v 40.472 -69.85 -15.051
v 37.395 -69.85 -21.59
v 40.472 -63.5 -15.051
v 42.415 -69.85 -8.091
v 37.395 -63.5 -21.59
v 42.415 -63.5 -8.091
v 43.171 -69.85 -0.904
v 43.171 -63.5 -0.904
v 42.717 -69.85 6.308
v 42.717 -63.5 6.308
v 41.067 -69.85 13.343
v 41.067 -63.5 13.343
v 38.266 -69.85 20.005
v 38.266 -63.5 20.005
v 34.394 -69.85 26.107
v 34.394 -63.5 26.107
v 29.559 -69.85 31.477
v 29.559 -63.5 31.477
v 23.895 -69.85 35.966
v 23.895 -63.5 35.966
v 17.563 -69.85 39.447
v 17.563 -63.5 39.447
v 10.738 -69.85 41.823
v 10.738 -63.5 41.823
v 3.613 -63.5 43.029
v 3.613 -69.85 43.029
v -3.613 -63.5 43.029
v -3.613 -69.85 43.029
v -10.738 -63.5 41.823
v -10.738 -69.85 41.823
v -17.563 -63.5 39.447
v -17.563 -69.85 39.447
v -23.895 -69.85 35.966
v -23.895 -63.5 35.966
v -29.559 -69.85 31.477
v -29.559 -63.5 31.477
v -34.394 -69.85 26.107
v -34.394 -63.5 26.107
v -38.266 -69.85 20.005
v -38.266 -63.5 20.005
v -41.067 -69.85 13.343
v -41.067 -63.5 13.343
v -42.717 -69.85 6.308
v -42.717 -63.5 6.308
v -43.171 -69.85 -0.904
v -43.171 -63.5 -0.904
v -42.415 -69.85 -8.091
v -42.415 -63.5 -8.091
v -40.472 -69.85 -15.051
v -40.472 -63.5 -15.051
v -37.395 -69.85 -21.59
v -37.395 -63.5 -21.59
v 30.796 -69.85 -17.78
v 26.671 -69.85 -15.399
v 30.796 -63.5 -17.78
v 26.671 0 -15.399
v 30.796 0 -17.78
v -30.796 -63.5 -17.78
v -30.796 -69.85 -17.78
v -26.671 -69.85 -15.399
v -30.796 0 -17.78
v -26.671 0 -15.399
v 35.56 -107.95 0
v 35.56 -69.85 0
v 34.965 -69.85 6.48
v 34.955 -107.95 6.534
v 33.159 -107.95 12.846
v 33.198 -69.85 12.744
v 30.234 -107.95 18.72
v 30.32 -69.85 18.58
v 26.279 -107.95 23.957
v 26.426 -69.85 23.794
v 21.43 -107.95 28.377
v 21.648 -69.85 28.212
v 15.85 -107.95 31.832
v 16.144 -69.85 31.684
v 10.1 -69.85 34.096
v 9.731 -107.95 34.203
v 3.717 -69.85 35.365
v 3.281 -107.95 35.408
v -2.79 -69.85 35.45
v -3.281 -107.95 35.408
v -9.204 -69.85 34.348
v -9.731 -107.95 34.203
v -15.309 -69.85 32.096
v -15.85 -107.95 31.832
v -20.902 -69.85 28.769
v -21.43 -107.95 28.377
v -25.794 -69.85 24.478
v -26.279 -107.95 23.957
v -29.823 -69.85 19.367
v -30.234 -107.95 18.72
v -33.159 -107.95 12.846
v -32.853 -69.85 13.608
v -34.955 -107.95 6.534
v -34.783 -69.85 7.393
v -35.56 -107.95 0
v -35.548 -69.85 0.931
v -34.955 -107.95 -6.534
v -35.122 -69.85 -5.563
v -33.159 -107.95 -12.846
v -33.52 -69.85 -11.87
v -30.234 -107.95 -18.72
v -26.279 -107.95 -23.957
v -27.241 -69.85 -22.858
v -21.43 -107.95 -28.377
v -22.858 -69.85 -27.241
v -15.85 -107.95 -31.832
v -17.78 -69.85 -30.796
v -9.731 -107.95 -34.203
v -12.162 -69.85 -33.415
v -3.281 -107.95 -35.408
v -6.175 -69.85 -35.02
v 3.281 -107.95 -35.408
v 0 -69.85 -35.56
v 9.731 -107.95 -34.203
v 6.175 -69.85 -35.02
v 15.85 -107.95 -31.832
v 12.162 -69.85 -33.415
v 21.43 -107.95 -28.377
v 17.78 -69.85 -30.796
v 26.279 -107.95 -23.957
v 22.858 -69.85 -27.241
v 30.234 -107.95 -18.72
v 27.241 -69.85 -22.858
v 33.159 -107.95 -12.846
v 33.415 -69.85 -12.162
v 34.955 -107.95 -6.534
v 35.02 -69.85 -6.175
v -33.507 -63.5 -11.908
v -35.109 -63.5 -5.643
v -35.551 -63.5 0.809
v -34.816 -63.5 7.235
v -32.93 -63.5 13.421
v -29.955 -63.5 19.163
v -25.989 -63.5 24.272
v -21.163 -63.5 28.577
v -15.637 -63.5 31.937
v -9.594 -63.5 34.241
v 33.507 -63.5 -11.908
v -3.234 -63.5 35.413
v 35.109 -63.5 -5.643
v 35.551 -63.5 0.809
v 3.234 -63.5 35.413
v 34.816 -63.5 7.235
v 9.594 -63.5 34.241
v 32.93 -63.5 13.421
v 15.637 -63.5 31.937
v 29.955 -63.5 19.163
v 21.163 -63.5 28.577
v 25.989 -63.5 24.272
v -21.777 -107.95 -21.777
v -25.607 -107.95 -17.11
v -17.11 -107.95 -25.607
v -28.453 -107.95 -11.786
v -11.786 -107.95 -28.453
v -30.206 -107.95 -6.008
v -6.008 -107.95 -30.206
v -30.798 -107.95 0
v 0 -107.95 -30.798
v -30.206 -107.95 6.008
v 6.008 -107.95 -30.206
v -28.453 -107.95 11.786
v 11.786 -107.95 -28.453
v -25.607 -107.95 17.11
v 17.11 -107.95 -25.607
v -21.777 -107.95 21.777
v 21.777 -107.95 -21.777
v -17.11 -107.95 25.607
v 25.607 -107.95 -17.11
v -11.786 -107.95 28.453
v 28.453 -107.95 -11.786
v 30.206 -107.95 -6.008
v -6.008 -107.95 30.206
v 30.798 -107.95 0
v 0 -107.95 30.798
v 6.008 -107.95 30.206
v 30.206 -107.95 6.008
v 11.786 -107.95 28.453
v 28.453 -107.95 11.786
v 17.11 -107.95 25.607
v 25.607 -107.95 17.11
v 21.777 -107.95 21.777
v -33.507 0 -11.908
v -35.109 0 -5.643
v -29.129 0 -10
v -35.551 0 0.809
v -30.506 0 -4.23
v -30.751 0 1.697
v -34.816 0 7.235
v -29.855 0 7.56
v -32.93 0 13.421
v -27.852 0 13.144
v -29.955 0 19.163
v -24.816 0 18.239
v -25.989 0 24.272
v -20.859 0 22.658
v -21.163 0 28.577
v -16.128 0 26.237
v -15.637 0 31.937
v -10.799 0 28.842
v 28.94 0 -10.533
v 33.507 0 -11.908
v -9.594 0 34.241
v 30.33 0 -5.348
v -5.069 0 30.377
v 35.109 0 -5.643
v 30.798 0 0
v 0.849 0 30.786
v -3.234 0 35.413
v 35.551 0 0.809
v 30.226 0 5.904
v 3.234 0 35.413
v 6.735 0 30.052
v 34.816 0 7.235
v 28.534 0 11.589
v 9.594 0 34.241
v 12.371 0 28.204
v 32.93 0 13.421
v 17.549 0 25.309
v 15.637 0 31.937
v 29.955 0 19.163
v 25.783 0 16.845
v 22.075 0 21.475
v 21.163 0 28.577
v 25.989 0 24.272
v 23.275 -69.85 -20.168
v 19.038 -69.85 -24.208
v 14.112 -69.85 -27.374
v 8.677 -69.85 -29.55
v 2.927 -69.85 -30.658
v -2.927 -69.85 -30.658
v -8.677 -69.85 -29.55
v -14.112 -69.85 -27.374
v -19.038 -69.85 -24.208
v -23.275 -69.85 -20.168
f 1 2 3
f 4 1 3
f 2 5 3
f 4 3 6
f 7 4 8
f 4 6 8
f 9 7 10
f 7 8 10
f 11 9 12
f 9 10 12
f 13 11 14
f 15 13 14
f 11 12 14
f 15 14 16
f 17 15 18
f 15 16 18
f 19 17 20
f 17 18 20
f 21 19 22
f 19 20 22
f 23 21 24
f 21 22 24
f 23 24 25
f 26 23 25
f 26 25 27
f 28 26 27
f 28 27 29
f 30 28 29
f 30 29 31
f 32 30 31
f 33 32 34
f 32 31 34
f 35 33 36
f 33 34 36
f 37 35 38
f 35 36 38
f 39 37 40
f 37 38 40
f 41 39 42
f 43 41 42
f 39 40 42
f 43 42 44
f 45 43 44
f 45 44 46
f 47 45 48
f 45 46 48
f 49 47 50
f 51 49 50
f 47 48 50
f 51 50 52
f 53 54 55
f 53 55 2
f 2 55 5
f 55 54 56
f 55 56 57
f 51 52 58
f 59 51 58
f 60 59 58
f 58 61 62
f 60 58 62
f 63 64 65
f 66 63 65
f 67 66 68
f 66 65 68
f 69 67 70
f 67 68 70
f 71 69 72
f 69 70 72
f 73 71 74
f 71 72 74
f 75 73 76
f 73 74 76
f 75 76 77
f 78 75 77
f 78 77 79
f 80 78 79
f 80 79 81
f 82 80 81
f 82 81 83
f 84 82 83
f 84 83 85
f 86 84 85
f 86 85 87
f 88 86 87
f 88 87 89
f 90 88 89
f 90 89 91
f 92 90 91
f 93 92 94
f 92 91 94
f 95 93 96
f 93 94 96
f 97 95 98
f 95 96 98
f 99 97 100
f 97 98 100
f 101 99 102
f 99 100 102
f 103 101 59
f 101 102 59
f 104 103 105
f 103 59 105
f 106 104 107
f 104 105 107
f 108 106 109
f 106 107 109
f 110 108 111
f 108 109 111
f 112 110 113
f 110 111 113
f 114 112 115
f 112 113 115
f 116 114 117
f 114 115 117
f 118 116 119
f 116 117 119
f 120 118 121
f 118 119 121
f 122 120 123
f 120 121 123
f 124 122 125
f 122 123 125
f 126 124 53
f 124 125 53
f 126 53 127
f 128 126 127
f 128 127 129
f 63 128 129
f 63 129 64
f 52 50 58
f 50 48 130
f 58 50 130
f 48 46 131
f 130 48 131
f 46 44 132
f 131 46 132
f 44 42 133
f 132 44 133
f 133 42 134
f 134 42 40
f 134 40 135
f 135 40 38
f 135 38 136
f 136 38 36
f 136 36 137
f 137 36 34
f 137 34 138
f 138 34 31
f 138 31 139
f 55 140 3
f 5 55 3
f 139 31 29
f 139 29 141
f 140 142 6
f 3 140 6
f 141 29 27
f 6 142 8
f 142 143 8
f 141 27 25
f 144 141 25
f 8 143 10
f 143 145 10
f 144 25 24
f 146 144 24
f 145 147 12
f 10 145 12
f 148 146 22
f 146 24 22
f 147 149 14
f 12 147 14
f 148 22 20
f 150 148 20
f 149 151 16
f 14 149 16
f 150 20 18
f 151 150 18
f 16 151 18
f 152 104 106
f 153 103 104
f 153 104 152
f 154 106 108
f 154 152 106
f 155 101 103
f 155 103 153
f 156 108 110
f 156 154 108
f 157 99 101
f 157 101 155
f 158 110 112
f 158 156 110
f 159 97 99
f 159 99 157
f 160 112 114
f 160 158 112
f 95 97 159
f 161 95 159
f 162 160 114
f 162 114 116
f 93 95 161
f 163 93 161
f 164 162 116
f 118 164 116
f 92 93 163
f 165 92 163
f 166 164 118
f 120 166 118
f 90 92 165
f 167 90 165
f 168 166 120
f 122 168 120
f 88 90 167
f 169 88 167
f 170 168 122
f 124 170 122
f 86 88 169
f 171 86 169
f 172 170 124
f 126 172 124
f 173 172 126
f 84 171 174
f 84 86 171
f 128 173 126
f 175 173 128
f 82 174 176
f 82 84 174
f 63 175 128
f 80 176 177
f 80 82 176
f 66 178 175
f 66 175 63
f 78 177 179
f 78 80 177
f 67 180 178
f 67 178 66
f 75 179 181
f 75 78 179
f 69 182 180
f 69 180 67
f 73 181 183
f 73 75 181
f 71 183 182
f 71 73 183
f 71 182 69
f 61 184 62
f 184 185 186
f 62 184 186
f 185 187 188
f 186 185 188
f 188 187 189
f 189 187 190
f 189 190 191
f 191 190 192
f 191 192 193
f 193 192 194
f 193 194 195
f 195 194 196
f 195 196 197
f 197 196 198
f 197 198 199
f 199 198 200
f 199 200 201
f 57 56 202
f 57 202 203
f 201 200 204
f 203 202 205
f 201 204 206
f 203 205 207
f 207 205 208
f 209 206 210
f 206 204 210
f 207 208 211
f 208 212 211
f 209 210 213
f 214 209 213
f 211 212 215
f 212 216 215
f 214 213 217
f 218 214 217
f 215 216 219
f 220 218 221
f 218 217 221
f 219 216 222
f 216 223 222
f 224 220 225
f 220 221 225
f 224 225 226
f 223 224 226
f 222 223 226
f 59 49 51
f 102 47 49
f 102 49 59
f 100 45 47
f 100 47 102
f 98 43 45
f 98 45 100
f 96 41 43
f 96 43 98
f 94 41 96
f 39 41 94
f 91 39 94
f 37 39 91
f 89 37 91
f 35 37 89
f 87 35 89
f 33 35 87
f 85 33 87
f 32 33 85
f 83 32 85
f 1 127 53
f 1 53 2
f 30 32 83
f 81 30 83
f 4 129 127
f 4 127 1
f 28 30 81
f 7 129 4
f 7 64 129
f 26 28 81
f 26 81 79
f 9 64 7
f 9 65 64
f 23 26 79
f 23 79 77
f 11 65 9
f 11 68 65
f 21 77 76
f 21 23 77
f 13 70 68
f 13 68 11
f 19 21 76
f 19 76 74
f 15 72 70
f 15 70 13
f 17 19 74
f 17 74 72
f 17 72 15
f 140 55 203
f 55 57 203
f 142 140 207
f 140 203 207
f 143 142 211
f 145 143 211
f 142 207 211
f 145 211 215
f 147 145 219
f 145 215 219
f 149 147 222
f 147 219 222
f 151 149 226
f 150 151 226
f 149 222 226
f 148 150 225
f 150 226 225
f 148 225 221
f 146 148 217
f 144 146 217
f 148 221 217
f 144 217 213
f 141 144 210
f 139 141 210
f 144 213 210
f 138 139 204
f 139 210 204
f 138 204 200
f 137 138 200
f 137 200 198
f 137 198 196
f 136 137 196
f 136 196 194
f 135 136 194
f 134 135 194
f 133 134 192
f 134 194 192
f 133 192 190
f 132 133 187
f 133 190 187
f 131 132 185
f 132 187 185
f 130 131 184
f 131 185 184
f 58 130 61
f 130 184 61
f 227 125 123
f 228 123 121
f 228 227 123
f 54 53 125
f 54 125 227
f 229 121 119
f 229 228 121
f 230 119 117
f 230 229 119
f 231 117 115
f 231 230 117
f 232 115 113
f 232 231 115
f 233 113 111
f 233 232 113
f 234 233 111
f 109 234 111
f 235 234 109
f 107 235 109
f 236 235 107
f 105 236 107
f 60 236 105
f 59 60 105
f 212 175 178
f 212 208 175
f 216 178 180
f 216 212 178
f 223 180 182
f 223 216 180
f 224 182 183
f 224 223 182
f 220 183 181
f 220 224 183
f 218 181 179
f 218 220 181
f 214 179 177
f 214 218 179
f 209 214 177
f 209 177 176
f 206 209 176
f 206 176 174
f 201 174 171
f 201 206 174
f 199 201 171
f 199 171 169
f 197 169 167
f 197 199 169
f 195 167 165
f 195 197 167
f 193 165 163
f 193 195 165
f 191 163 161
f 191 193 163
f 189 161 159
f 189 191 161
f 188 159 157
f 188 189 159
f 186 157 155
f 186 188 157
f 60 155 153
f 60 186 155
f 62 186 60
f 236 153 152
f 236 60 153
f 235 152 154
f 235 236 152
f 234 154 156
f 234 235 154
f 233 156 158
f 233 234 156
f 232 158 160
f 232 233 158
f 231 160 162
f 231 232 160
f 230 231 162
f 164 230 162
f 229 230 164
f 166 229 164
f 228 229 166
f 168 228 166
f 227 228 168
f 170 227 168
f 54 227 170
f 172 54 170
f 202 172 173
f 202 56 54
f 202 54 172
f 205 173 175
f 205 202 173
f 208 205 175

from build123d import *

# Parameters (mm, degrees)
F0_R     = 35.56
F0_R_2   = 30.7975
F1_DEPTH = 63.5
F2_R     = 43.18
F2_R_2   = 35.56
F2_R_3   = 30.7975
F3_DEPTH = 6.35
F4_R     = 35.56
F4_R_2   = 30.7975
F5_DEPTH = 38.1
F7_DEPTH = 63.5
F9_DEPTH = 6.35


with BuildPart() as f1:
    # F0 (on Front) → F1 (new body)
    with BuildSketch(Plane.XZ):
        Circle(F0_R)
        Circle(F0_R_2, mode=Mode.SUBTRACT)
    extrude(amount=F1_DEPTH)

    # F2 (on face) → F3 (join)
    with BuildSketch(Plane.XZ.offset(63.5)):
        Circle(F2_R)
        Circle(F2_R_2, mode=Mode.SUBTRACT)
        Circle(F2_R_2)
        Circle(F2_R_3, mode=Mode.SUBTRACT)
    extrude(amount=F3_DEPTH)

    # F4 (on face) → F5 (join)
    with BuildSketch(Plane.XZ.offset(69.85)):
        Circle(F4_R)
        Circle(F4_R_2, mode=Mode.SUBTRACT)
    extrude(amount=F5_DEPTH)

    # F6 (on face) → F7 (cut, through all)
    with BuildSketch(Plane(origin=(0, 0, 0), x_dir=(-1, 0, 0), z_dir=(0, 1, 0))):
        with BuildLine():
            Line((26.6714173731, -15.39875), (0, 0))
            Line((0, 0), (-26.6714173731, -15.39875))
            ThreePointArc((-26.6714173731, -15.39875), (0, -30.7975), (26.6714173731, -15.39875))
        make_face()
        with BuildLine():
            ThreePointArc((26.6714173731, -15.39875), (0, -30.7975), (-26.6714173731, -15.39875))
            Line((-26.6714173731, -15.39875), (-30.7958633586, -17.78))
            ThreePointArc((-30.7958633586, -17.78), (0, -35.56), (30.7958633586, -17.78))
            Line((30.7958633586, -17.78), (26.6714173731, -15.39875))
        make_face()
        with BuildLine():
            ThreePointArc((30.7958633586, -17.78), (0, -35.56), (-30.7958633586, -17.78))
            Line((-30.7958633586, -17.78), (-66.8170764648, -38.5768570834))
            Line((-66.8170764648, -38.5768570834), (66.8170764648, -38.5768570834))
            Line((66.8170764648, -38.5768570834), (30.7958633586, -17.78))
        make_face()
    extrude(amount=-F7_DEPTH, mode=Mode.SUBTRACT)

    # F8 (on face) → F9 (cut, through all)
    with BuildSketch(Plane(origin=(0, -63.5, 0), x_dir=(-1, 0, 0), z_dir=(0, 1, 0))):
        with BuildLine():
            Line((30.7958633586, -17.78), (26.6714173731, -15.39875))
            ThreePointArc((26.6714173731, -15.39875), (0, -30.7975), (-26.6714173731, -15.39875))
            Line((-26.6714173731, -15.39875), (-30.7958633586, -17.78))
            Line((-30.7958633586, -17.78), (-37.3949769354, -21.59))
            ThreePointArc((-37.3949769354, -21.59), (0, -43.18), (37.3949769354, -21.59))
            Line((37.3949769354, -21.59), (30.7958633586, -17.78))
        make_face()
    extrude(amount=-F9_DEPTH, mode=Mode.SUBTRACT)


solid = f1.part
